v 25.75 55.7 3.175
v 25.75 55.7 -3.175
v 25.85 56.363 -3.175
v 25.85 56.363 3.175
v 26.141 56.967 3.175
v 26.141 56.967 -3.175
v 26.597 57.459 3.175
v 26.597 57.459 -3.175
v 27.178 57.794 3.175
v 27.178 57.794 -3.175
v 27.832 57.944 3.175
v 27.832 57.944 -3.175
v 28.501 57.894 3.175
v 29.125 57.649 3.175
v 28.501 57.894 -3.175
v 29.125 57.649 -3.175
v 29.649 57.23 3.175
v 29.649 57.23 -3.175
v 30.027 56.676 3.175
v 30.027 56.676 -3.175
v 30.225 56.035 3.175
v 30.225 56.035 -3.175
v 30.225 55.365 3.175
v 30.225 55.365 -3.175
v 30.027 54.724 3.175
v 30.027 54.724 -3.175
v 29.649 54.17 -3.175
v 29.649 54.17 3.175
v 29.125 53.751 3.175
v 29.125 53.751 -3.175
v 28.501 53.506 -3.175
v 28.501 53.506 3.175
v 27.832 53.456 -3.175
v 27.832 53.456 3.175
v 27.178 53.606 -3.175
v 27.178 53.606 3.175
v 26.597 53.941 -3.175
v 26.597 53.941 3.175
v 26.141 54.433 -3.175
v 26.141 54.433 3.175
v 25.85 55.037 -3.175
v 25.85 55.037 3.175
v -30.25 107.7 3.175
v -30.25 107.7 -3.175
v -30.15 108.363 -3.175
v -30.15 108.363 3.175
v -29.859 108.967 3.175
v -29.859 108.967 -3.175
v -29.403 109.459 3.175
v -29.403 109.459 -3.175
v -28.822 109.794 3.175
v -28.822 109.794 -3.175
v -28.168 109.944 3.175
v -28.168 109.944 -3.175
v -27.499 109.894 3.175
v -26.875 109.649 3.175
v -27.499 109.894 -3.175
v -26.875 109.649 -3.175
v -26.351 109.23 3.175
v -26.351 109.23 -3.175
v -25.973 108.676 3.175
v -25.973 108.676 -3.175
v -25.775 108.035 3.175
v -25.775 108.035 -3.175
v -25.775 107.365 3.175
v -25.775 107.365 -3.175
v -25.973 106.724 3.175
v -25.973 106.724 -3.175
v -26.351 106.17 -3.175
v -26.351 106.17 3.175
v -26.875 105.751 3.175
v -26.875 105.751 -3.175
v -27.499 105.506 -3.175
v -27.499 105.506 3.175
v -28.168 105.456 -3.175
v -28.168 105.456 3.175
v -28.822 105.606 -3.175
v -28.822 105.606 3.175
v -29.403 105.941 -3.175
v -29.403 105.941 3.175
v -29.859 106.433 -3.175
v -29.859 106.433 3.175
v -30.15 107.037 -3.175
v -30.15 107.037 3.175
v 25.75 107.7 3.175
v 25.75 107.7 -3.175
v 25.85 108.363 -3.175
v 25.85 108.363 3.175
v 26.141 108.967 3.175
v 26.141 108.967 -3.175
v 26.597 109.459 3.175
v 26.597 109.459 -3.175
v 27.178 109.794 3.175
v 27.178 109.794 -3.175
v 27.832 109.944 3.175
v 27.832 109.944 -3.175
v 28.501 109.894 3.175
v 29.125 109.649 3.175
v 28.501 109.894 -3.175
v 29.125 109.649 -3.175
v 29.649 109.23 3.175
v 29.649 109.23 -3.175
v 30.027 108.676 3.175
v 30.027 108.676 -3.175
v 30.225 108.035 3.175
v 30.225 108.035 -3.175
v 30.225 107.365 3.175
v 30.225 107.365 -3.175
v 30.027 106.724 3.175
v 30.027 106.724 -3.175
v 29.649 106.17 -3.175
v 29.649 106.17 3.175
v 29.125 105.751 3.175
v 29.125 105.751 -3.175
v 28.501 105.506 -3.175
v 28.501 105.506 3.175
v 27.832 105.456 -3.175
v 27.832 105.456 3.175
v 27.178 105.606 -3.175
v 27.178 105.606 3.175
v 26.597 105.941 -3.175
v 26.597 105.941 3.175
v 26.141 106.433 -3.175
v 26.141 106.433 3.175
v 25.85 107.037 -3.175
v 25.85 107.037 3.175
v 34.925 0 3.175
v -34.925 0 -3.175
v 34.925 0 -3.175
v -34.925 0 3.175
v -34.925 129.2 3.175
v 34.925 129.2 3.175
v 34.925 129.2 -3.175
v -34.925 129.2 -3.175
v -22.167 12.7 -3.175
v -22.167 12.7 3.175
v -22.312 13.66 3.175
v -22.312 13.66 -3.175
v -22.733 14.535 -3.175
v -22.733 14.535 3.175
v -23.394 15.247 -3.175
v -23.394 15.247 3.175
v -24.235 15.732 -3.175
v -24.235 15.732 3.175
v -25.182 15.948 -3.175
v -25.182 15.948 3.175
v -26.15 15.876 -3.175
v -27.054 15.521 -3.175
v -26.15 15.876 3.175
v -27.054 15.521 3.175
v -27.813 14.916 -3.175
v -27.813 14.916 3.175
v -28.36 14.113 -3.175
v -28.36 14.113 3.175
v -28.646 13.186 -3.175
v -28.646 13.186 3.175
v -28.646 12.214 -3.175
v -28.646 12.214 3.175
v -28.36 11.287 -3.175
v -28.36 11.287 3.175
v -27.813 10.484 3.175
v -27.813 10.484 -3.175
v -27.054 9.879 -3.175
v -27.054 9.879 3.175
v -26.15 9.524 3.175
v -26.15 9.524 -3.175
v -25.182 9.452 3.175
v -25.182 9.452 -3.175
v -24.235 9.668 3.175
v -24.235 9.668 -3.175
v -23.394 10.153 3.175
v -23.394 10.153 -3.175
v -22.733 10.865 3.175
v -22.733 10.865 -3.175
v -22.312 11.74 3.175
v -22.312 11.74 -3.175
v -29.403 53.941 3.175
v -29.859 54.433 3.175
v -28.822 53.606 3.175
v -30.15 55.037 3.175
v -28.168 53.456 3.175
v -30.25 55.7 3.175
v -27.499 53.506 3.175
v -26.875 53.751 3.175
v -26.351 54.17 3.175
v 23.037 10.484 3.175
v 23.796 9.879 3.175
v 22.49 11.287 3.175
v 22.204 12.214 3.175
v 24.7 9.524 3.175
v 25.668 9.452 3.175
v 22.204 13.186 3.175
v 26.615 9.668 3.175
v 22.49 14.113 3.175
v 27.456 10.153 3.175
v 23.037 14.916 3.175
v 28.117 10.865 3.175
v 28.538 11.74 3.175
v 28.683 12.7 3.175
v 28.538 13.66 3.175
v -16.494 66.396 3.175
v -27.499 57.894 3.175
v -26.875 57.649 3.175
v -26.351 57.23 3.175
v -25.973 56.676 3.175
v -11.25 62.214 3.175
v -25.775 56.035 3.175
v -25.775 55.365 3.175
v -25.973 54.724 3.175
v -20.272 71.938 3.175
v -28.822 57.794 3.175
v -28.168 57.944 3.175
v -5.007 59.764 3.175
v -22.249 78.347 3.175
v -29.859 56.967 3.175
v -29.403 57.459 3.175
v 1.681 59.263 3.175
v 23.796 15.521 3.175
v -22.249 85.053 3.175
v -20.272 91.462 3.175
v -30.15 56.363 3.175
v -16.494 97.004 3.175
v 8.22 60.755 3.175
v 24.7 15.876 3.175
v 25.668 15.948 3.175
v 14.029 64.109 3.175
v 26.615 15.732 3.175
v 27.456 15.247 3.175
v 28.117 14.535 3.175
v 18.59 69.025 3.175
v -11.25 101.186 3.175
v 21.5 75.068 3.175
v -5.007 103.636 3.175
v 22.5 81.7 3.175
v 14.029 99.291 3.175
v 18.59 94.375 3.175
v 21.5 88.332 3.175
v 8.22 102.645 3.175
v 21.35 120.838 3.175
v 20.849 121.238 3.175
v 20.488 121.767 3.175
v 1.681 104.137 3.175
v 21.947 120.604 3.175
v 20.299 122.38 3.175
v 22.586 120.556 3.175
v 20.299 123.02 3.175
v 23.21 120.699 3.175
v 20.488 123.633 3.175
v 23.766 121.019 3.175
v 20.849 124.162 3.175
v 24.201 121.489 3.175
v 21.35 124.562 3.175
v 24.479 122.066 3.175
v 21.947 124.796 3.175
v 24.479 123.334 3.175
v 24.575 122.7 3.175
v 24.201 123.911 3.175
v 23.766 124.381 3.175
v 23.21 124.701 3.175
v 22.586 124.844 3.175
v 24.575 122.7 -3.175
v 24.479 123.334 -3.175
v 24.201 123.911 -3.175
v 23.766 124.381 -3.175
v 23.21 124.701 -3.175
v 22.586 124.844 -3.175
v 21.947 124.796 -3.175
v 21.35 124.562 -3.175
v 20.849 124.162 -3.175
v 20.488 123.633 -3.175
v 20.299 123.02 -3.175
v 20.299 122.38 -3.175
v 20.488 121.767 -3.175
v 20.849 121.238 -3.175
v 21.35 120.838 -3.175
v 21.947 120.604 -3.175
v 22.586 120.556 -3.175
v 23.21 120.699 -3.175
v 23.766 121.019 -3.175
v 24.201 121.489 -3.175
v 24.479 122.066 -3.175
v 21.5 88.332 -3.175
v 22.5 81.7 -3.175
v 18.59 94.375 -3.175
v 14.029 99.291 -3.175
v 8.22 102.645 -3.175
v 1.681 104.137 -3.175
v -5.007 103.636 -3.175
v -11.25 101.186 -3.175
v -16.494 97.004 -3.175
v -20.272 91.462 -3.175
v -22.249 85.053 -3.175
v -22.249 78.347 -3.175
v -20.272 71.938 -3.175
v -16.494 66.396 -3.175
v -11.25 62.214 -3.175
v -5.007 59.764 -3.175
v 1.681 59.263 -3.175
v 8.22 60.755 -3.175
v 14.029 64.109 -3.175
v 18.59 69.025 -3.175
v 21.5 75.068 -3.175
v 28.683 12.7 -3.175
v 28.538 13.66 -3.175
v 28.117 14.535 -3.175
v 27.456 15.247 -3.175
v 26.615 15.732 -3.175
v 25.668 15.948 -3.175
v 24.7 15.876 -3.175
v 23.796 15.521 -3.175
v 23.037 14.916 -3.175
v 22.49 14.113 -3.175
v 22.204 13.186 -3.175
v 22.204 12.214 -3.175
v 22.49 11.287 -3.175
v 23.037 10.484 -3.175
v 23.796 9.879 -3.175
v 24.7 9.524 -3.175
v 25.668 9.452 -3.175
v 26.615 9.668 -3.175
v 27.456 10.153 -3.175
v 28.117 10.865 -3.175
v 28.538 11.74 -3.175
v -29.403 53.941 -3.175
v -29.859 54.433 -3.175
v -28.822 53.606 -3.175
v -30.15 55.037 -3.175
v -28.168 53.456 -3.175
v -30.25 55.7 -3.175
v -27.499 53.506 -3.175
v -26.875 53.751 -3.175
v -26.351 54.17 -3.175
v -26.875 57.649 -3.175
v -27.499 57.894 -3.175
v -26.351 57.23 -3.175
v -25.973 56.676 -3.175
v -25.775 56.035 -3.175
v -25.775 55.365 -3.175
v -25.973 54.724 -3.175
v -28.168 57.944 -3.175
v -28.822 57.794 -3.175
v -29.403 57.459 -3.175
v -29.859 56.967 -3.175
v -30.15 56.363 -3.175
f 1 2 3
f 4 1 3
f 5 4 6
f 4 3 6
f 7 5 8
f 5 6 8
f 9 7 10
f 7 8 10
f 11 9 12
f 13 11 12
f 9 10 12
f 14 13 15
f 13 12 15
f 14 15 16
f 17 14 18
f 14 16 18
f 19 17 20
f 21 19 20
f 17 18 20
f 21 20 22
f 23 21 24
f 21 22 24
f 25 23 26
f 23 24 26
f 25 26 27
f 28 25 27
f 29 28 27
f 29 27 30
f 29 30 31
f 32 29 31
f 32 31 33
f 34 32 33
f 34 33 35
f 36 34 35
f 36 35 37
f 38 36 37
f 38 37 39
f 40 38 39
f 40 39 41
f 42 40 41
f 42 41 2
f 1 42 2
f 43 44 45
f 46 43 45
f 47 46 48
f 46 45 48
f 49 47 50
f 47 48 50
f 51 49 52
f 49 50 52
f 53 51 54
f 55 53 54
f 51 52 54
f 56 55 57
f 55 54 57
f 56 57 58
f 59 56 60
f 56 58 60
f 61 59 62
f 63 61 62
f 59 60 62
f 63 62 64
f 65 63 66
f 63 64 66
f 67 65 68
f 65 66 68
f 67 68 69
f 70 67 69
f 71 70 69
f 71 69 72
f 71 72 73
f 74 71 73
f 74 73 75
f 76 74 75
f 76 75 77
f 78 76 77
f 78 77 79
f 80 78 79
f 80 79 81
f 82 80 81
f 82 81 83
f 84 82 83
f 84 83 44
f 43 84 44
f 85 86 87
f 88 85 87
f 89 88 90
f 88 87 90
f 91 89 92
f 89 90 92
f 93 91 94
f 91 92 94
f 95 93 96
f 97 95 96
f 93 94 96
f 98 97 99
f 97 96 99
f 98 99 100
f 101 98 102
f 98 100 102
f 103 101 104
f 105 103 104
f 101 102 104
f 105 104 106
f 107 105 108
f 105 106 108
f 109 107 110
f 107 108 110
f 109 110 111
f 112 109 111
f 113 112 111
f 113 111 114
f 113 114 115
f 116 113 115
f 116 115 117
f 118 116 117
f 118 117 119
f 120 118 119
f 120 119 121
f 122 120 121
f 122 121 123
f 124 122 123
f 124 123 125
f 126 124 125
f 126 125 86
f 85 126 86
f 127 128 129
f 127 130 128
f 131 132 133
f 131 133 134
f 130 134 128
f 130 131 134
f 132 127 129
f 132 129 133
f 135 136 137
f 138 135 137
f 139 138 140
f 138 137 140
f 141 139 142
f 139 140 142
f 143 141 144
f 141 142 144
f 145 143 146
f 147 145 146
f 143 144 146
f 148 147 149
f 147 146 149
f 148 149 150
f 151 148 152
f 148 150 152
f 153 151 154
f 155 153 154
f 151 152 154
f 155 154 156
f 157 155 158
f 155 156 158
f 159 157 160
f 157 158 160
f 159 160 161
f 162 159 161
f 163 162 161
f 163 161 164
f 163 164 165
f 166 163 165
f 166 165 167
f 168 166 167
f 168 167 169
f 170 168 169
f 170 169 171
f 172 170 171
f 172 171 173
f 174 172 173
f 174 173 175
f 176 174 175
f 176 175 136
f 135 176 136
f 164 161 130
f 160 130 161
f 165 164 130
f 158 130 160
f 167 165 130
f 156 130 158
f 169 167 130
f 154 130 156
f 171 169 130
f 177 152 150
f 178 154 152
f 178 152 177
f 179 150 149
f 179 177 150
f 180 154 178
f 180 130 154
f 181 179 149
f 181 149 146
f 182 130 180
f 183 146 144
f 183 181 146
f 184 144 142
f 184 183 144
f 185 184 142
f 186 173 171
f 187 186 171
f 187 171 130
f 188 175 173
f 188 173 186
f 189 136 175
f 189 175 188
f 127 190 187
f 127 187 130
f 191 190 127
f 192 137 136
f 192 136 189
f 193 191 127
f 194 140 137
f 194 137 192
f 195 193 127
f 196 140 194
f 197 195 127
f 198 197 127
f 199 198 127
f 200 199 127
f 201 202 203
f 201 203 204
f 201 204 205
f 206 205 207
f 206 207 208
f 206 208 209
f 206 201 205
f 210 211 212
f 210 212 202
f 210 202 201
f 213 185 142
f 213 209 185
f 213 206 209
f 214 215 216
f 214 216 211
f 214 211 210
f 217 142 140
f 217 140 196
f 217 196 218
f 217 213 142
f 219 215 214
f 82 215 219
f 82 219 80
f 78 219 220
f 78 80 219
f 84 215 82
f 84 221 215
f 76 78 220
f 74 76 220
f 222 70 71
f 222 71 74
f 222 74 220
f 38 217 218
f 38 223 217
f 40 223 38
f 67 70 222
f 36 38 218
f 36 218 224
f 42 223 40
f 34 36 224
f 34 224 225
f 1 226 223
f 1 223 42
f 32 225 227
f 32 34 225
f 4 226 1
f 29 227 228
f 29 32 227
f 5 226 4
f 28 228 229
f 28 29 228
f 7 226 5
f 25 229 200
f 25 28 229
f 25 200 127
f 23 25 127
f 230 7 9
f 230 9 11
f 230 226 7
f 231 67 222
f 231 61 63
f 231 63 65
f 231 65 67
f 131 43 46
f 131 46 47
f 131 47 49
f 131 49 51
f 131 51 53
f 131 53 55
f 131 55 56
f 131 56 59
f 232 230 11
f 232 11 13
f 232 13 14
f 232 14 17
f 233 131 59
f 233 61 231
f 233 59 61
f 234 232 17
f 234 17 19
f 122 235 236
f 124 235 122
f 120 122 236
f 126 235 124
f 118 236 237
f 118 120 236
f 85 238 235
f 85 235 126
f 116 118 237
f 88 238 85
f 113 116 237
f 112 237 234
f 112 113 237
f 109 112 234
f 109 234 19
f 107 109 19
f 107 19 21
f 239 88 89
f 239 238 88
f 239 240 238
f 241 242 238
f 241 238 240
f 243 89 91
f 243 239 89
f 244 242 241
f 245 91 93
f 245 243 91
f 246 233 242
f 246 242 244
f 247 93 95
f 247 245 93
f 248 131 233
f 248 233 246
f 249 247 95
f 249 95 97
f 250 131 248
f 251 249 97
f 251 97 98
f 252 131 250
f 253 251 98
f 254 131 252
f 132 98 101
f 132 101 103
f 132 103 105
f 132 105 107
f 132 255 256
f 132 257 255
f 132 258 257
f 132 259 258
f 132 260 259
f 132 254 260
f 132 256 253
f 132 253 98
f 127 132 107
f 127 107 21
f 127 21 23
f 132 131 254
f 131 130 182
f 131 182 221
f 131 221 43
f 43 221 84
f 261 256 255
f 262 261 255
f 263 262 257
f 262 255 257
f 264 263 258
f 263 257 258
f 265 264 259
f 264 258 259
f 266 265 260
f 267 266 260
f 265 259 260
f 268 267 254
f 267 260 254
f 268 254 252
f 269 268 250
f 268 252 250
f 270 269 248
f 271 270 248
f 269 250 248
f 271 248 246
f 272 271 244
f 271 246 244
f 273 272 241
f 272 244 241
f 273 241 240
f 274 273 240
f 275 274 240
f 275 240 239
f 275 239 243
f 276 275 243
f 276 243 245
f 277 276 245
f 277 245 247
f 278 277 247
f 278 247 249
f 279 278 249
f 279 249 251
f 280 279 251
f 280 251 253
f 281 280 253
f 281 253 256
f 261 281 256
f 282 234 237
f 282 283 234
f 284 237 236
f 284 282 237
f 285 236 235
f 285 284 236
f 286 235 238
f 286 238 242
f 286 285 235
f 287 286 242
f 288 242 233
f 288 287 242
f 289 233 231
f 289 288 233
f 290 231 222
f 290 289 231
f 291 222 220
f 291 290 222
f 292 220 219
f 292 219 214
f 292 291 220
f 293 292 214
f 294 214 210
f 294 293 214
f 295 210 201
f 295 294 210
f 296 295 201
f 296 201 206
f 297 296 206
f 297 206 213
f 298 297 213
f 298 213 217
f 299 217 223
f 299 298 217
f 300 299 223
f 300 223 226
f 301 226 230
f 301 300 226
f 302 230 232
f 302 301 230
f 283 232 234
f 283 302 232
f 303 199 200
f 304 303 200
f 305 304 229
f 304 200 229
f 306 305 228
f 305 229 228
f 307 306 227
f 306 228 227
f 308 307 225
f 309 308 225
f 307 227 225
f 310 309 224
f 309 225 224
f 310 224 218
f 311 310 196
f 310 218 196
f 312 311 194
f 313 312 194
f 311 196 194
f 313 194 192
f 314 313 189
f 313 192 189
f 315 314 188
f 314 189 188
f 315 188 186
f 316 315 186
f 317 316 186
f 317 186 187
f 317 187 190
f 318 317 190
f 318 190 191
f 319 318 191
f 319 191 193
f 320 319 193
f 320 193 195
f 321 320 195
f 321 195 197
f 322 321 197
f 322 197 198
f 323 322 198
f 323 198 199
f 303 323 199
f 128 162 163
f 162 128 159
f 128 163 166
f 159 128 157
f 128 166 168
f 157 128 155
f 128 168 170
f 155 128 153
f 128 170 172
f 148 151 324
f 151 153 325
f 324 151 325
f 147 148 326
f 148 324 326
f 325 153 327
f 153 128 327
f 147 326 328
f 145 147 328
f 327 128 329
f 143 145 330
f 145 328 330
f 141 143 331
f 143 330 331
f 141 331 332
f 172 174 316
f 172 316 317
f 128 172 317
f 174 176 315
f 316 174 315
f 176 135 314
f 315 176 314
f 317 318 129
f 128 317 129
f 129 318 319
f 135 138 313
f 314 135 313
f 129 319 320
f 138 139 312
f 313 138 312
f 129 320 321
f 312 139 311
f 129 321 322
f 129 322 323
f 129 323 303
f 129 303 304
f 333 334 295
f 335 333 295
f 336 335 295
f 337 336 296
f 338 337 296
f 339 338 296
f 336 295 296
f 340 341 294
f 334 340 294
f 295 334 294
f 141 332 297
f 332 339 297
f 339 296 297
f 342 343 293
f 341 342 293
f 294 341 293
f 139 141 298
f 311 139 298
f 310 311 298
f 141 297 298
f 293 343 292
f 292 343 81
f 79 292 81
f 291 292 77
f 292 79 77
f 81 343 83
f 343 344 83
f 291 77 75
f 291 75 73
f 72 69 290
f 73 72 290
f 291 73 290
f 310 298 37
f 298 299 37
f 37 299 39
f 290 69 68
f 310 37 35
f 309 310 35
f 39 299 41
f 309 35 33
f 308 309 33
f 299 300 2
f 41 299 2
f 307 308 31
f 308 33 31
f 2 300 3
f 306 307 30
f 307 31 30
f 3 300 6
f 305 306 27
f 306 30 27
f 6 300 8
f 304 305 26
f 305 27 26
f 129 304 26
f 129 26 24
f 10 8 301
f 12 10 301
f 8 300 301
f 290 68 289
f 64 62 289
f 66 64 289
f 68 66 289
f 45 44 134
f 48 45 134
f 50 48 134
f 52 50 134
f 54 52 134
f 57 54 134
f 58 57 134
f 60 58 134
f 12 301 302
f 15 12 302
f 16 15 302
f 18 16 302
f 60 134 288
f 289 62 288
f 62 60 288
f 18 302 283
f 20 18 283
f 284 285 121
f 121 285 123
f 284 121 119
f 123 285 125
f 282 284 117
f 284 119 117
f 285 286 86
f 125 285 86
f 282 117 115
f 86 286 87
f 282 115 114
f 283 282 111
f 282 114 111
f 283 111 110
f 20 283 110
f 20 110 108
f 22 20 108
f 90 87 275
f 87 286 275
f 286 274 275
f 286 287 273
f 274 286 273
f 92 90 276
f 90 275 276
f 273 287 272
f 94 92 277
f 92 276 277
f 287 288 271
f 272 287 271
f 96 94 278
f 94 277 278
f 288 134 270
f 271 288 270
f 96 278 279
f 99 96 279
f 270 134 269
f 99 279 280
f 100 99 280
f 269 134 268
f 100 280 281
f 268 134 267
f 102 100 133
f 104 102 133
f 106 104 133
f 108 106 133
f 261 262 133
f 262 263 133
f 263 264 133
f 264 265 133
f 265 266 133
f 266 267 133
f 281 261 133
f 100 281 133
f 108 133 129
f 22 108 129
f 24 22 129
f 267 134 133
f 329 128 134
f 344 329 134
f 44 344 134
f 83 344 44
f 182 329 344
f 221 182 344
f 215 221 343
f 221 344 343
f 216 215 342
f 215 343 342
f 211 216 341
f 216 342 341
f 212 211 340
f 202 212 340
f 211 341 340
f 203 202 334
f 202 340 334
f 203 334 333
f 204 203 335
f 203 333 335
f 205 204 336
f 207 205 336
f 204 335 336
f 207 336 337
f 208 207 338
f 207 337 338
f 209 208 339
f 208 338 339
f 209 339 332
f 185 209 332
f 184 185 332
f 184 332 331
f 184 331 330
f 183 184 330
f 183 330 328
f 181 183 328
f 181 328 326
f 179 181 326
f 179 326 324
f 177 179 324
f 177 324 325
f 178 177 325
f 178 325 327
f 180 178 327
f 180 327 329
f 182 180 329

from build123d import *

# Parameters (mm, degrees)
SKETCH2_R               = 22.5
BOSS_EXTRUDE1_DEPTH     = 3.175
SKETCH3_R               = 3.25755
SKETCH3_R_2             = 2.15
CUT_EXTRUDE1_DEPTH      = 1
CUT_EXTRUDE1_DEPTH_BACK = 7.35
SKETCH4_R               = 2.25
CUT_EXTRUDE2_DEPTH      = 1
CUT_EXTRUDE2_DEPTH_BACK = 7.35


with BuildPart() as part:
    # Sketch2 → Boss-Extrude1 (new body, symmetric)
    with BuildSketch(Plane.XY):
        Polygon((-34.925, 0), (34.925, 0), (34.925, 81.7), (34.925, 114.2), (34.925, 129.2), (-34.925, 129.2), (-34.925, 114.2), (-34.925, 81.7), align=None)
        with Locations((0, 81.7)):
            Circle(SKETCH2_R, mode=Mode.SUBTRACT)
    extrude(amount=BOSS_EXTRUDE1_DEPTH, both=True)

    # Sketch3 → Cut-Extrude1 (cut, two sides)
    with BuildSketch(Plane.XY.offset(3.175)) as cut_extrude1_sk:
        with Locations((-25.425, 12.7)):
            Circle(SKETCH3_R)
        with Locations((25.425, 12.7)):
            Circle(SKETCH3_R)
        with Locations((22.425, 122.7)):
            Circle(SKETCH3_R_2)
    extrude(amount=CUT_EXTRUDE1_DEPTH, mode=Mode.SUBTRACT)
    extrude(cut_extrude1_sk.sketch, amount=-CUT_EXTRUDE1_DEPTH_BACK, mode=Mode.SUBTRACT)

    # Sketch4 → Cut-Extrude2 (cut, two sides)
    with BuildSketch(Plane(origin=(0, 0, -3.175), x_dir=(-1, 0, 0), z_dir=(0, 0, -1))) as cut_extrude2_sk:
        with Locations((-28, 107.7)):
            Circle(SKETCH4_R)
        with Locations((28, 107.7)):
            Circle(SKETCH4_R)
        with Locations((-28, 55.7)):
            Circle(SKETCH4_R)
        with Locations((28, 55.7)):
            Circle(SKETCH4_R)
    extrude(amount=CUT_EXTRUDE2_DEPTH, mode=Mode.SUBTRACT)
    extrude(cut_extrude2_sk.sketch, amount=-CUT_EXTRUDE2_DEPTH_BACK, mode=Mode.SUBTRACT)


solid = part.part
